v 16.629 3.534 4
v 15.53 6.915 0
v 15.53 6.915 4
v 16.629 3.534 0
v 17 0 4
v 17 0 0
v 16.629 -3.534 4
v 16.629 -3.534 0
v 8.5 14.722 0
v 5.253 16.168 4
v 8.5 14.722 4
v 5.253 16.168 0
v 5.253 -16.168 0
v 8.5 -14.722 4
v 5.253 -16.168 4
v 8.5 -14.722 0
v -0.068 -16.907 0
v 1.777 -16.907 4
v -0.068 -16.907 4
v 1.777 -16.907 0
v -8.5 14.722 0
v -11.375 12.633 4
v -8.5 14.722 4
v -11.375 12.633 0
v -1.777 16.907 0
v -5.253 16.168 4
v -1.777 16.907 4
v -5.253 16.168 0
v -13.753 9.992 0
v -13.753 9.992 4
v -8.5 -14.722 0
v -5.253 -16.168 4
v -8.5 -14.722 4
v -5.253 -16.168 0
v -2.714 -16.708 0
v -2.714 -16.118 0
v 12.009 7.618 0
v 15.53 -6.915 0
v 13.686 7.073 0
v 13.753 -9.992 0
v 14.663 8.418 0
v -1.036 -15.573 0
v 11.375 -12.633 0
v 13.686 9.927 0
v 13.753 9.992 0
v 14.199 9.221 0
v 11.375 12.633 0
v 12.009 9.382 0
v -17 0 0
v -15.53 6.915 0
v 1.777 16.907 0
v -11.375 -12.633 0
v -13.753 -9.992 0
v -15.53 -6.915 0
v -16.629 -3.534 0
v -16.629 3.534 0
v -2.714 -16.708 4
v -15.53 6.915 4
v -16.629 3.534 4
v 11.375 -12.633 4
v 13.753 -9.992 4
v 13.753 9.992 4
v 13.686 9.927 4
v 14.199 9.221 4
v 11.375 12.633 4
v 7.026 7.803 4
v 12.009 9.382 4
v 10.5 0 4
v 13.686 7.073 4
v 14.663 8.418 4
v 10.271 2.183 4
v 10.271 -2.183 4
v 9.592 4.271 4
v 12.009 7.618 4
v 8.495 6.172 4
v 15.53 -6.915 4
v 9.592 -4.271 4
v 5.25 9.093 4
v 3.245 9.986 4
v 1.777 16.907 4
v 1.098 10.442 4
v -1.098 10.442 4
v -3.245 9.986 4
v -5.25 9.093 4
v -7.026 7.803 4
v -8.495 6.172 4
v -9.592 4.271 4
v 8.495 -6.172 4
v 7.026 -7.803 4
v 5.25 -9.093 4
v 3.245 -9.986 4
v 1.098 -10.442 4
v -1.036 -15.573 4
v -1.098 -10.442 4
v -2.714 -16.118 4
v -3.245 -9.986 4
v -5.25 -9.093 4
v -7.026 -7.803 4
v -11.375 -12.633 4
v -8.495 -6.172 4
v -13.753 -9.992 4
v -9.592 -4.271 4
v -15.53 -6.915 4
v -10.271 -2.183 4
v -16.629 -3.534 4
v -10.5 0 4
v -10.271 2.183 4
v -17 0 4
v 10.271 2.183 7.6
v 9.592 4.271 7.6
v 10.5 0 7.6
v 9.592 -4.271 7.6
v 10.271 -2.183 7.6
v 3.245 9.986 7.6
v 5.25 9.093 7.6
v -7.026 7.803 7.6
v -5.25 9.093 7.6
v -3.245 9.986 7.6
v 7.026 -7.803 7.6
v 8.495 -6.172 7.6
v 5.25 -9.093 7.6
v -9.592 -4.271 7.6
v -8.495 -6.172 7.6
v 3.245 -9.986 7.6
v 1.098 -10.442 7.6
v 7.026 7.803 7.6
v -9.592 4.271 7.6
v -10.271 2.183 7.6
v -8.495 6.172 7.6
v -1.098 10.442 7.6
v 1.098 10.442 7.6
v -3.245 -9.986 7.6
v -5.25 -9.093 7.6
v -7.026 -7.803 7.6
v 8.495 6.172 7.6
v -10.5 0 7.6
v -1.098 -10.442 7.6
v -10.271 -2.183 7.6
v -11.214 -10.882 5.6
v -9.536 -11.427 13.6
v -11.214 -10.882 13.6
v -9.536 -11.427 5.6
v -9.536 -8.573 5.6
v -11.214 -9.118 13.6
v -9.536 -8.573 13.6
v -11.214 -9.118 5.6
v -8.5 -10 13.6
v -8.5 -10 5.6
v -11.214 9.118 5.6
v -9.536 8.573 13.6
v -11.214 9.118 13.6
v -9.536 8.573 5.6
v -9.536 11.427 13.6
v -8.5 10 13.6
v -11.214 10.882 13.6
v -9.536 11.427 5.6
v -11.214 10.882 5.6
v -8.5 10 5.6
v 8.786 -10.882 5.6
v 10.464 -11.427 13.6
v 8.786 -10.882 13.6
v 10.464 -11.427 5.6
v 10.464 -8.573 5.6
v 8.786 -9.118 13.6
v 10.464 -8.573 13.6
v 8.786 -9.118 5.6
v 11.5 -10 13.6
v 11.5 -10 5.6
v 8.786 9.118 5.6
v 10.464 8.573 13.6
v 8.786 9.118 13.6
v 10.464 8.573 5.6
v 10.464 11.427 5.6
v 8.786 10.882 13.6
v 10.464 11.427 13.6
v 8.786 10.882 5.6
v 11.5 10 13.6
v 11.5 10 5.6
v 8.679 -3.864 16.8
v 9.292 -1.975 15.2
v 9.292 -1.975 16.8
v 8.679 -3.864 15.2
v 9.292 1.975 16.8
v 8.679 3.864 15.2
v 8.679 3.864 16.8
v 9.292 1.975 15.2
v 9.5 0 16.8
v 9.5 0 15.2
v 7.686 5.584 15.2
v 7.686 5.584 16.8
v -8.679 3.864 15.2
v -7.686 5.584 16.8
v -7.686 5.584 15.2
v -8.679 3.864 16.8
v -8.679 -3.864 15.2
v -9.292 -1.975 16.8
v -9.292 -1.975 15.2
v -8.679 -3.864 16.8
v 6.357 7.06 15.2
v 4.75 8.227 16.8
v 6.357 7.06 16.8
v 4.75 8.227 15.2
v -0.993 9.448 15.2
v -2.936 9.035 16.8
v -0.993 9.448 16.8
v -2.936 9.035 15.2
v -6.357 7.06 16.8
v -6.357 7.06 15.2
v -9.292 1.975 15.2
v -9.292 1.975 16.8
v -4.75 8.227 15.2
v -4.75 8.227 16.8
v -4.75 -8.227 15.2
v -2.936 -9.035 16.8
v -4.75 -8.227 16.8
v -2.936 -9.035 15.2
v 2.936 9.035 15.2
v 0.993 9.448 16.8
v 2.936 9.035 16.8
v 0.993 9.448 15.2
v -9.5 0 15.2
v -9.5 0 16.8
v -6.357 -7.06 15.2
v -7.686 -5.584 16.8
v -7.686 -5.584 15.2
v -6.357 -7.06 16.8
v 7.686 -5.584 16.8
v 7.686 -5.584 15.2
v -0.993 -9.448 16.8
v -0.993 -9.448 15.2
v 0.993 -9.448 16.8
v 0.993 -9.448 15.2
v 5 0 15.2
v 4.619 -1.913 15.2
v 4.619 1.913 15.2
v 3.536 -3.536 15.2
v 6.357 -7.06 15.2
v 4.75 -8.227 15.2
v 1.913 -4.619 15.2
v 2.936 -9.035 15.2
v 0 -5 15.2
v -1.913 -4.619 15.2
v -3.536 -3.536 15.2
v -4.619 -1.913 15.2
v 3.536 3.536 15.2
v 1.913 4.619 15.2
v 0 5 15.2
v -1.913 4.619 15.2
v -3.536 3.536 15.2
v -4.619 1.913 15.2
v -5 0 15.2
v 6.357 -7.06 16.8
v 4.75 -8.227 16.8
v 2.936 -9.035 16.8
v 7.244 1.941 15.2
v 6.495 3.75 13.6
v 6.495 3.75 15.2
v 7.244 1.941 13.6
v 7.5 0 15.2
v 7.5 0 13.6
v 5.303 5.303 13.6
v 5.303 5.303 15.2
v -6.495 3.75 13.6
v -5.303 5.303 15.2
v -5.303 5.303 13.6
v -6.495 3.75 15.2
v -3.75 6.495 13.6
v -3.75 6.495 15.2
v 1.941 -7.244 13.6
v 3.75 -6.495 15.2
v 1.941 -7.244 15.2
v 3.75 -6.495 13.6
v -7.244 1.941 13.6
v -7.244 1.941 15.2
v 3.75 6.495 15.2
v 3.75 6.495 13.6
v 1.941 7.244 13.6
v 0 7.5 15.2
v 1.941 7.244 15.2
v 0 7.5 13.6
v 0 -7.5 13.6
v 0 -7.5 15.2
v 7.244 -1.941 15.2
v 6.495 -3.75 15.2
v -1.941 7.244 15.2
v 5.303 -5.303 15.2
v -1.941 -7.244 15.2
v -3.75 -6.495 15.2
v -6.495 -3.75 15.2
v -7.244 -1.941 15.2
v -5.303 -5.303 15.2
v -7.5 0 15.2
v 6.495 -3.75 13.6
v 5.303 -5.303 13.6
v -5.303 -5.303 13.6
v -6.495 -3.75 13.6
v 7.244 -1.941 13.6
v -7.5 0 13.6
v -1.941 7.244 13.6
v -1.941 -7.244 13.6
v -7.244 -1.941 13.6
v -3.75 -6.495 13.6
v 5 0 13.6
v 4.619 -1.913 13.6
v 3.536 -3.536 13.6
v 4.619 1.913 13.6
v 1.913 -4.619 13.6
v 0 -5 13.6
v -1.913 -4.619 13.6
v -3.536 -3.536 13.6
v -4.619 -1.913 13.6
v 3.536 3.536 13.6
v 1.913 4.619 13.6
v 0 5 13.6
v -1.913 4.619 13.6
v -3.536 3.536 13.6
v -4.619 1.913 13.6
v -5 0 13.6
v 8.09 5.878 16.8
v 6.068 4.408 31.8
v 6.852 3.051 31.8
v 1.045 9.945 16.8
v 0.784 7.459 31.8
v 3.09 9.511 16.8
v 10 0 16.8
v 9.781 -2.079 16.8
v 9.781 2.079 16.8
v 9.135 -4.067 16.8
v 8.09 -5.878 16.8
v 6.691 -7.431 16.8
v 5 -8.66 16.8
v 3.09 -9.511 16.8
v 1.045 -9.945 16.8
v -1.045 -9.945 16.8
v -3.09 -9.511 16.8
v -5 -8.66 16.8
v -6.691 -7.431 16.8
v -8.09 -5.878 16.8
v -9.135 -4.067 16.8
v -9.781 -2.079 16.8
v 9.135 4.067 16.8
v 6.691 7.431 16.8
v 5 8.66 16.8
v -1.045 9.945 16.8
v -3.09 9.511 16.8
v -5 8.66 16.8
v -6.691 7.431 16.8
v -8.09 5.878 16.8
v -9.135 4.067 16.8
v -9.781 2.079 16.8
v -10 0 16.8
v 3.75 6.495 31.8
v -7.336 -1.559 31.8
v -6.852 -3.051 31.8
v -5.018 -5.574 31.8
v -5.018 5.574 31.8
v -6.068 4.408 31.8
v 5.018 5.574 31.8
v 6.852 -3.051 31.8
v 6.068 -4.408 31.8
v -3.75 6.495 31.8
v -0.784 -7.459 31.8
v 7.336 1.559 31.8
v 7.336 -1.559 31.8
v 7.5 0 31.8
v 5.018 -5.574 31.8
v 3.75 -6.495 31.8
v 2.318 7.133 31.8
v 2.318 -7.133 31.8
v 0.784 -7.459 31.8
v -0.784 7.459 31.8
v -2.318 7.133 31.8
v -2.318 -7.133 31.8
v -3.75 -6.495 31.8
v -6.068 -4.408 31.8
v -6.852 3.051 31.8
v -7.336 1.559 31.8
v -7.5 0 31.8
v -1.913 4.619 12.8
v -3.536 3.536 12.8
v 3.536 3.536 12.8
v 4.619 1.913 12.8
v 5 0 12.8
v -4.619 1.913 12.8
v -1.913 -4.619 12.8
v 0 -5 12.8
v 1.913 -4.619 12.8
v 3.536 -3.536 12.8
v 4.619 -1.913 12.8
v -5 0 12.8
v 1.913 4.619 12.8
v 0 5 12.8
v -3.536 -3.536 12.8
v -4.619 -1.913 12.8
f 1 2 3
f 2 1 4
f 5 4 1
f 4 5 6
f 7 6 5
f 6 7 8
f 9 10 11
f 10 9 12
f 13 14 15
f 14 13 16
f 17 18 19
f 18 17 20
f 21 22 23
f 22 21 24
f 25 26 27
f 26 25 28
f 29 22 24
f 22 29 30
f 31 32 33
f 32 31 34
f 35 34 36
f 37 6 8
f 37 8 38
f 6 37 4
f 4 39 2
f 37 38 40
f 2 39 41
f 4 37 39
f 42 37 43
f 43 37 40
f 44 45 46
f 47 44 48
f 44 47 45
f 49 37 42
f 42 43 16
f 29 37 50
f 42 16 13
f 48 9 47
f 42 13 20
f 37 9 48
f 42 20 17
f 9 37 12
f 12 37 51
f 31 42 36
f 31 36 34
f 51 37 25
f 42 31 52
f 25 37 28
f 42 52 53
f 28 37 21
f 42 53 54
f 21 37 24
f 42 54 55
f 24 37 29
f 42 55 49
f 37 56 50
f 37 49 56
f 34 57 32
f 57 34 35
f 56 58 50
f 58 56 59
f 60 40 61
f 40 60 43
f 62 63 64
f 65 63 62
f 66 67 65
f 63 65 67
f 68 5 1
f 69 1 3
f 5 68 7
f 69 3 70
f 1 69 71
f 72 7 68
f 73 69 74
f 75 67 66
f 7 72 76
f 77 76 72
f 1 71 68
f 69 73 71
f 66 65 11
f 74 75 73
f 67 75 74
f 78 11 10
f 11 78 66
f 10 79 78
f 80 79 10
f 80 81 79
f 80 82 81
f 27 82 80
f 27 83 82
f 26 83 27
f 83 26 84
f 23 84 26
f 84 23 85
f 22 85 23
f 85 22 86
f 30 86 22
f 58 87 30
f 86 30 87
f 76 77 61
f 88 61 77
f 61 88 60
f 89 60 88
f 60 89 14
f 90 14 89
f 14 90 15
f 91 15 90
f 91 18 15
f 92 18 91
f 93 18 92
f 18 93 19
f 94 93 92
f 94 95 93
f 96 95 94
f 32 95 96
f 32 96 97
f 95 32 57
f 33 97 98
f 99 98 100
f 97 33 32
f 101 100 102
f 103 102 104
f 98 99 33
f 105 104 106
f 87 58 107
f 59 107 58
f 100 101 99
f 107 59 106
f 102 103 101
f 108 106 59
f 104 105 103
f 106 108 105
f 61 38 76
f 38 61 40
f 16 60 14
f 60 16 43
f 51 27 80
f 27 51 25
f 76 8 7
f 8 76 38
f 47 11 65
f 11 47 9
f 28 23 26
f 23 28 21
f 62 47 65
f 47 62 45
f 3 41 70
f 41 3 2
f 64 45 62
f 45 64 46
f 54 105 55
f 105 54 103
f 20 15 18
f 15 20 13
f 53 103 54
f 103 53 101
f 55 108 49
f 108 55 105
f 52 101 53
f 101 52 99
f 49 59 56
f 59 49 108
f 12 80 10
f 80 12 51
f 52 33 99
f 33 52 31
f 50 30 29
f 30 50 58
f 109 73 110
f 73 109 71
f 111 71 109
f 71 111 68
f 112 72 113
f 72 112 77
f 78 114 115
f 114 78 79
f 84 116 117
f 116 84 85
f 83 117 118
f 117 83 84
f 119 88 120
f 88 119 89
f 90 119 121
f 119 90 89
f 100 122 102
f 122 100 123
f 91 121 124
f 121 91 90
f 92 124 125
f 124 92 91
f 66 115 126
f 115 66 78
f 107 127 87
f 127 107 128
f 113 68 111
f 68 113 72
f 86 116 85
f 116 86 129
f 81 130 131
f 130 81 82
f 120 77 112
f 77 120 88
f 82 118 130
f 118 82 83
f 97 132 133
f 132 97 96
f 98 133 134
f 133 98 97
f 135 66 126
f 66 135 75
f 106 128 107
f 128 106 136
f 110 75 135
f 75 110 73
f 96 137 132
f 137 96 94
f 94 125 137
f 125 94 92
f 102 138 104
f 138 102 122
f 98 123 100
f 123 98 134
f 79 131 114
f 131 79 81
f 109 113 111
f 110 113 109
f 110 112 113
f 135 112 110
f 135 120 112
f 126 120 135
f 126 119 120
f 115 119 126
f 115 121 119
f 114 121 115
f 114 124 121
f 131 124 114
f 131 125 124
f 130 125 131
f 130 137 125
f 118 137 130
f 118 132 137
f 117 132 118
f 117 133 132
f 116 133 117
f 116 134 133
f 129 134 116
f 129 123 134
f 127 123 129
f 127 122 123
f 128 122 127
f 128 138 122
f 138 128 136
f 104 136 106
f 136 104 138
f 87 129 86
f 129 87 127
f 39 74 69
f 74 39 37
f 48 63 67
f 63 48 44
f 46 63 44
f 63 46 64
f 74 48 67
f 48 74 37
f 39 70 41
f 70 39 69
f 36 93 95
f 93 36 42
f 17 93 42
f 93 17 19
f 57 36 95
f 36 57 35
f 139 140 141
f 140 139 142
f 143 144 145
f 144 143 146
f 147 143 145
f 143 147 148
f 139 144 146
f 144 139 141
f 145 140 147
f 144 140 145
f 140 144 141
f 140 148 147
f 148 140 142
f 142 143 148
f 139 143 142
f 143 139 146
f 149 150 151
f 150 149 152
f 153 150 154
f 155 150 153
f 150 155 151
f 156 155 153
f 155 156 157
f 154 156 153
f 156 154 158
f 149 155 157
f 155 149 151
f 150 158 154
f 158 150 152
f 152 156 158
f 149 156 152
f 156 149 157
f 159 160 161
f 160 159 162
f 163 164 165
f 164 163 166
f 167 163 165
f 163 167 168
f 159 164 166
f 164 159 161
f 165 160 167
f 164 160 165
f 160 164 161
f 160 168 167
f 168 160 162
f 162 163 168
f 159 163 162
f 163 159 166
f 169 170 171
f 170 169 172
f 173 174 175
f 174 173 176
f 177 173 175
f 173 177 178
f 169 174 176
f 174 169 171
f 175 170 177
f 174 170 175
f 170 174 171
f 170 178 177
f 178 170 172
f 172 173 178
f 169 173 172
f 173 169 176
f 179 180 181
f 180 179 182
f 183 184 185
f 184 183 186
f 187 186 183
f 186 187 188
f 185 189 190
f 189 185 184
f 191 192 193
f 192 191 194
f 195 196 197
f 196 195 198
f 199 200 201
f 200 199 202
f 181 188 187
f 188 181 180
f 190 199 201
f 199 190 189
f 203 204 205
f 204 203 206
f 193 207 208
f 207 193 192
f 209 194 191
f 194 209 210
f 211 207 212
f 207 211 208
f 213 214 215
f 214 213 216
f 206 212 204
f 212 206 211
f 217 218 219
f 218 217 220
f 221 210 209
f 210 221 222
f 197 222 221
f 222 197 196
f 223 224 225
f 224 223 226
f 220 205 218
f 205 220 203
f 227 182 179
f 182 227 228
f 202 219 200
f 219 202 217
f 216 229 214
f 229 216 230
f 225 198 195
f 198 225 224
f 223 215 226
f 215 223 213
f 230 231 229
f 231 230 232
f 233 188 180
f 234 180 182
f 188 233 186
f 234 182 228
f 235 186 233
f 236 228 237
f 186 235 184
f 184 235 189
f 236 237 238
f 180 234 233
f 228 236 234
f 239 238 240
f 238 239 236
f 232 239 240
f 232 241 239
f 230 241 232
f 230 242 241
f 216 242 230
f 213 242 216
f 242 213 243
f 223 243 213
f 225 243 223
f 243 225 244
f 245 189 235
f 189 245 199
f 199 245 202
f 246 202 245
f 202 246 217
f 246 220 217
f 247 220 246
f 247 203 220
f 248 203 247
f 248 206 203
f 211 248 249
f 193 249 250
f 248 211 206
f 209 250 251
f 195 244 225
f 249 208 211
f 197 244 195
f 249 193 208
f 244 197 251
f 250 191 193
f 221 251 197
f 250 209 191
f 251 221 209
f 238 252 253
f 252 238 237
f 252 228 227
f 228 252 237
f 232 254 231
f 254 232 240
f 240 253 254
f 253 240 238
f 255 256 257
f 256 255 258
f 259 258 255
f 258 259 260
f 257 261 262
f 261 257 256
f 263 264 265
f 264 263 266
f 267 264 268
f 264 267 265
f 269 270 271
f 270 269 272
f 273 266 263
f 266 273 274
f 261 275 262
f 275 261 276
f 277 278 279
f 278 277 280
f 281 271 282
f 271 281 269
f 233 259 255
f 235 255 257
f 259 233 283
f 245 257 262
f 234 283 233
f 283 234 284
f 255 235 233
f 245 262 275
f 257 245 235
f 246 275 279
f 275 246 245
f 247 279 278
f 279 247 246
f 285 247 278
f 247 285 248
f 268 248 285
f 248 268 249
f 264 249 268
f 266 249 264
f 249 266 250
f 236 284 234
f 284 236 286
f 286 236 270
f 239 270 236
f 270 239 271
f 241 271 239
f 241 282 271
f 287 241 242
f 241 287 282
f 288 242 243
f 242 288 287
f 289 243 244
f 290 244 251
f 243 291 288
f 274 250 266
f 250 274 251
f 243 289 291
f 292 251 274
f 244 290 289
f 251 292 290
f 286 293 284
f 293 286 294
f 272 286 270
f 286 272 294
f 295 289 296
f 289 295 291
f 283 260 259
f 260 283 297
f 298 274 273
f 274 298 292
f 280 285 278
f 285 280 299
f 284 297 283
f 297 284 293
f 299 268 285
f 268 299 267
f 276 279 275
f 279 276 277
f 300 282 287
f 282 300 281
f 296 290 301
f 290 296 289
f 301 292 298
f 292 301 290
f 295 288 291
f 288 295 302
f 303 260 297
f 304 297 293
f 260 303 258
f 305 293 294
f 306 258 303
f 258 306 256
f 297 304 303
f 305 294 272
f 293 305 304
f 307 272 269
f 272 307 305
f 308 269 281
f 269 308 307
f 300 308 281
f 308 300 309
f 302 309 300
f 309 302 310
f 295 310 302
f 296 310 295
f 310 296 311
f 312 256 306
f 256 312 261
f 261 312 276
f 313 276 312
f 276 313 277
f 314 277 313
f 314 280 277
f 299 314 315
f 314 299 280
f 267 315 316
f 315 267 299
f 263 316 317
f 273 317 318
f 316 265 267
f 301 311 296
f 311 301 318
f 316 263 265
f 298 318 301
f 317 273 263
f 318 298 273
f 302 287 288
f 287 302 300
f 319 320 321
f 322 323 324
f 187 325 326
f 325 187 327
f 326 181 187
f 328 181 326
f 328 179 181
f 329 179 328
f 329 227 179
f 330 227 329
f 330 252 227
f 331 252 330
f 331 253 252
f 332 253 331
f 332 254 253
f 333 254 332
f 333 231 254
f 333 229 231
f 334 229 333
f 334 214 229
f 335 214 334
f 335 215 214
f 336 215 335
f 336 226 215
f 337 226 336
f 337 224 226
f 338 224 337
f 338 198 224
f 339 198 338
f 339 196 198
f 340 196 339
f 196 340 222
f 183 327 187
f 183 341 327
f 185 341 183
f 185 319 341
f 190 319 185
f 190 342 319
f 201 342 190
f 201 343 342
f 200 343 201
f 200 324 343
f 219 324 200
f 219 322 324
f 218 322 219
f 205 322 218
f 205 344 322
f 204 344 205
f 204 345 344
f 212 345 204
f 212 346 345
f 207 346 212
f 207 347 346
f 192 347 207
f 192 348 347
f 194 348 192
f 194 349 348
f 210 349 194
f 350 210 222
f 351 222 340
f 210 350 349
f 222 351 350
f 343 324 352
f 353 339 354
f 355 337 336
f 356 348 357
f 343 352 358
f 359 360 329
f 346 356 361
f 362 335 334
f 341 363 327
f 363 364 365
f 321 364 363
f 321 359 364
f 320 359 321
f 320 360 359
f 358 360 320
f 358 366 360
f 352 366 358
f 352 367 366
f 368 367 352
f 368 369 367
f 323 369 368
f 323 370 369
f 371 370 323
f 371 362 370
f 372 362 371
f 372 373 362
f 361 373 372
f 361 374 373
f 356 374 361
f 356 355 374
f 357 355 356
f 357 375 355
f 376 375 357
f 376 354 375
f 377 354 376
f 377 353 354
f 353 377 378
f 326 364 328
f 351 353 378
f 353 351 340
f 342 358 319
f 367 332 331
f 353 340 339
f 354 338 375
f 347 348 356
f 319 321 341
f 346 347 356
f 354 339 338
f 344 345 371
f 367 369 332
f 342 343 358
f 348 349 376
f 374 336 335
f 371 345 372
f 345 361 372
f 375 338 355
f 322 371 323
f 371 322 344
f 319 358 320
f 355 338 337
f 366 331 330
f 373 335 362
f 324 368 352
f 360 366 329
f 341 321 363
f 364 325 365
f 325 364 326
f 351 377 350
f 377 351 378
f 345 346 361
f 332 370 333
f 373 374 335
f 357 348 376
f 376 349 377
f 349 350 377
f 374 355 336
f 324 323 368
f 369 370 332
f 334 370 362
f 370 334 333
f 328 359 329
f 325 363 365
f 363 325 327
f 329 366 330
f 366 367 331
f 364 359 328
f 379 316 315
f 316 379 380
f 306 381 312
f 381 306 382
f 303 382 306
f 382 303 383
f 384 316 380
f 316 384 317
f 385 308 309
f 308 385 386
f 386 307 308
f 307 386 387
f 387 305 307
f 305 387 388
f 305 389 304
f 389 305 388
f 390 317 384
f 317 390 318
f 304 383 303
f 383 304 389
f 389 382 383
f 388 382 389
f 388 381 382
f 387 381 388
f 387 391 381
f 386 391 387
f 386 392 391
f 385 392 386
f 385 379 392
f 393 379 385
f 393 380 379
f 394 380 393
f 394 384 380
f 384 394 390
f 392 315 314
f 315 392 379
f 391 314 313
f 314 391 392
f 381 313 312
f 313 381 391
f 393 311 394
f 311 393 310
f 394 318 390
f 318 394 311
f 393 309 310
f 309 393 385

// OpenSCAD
// moisture_probe.scad — 电容式含水率探头 3D 设计
// ================================================
// Topic 5 Day 3 | Author: Little Husky 🐕 | Date: 2026-04-25
//
// v2 2026-05-17: Critical fixes:
//  - Funnel bottom now directly contacts upper press plate (was 7.2mm gap)
//  - Funnel bottom dia = plate_size (15mm) matching electrode (was 17mm)
//  - Funnel taller (15mm vs 7.2mm) for better bean guidance
//  - Guide channel extends from press top into electrode gap
//  - Cable exit moved from flange edge to funnel sidewall (fracture risk)
//  - Upper press central hole enlarged from φ2 to φ4 (bean passage)

// ═══════════════════════════════════════════════════════════
// 参数配置
// ═══════════════════════════════════════════════════════════

// 电极参数
plate_size = 15;      // mm — 电极边长（正方形）
plate_thick = 1.6;   // mm — PCB板厚度（FR4）

// 间隙参数
gap = 8.0;            // mm — 两极板间距离（含豆空间）
post_dia = 3.0;      // mm — 隔离柱直径

// 法兰参数
flange_dia = 34;     // mm — 安装法兰直径
flange_thick = 4;   // mm — 法兰厚度
bolt_hole_dia = 3.0; // mm — M3螺栓孔径
bolt_count = 3;      // M3螺栓数量

// 漏斗参数
funnel_top_dia = 20;        // mm — 入口直径
funnel_bot_dia = plate_size; // mm — 出口直径 = 电极尺寸，精准对接
funnel_height_mm = 15;      // mm — 漏斗高度（v2: 从7.2mm增至15mm）
guide_channel_dia = 10;     // mm — 导豆通道直径（v2新增）
guide_channel_depth = 4;    // mm — 导豆通道延伸深度（伸入电极间隙上半部）

// 电缆出口
cable_hole_dia = 6;  // mm — M6电缆密封头

// ═══════════════════════════════════════════════════════════
// Z坐标计算（关键：确保漏斗与压板零间隙对接）
// ═══════════════════════════════════════════════════════════
// z=0~4:           法兰底座 (flange_thick=4)
// z=4~5.6:         下极板托架 (plate_thick=1.6)
// z=5.6~6.6:       下极板PCB (计入托架余量)
// z=6.6~14.6:      电极间隙 (gap=8)
// z=14.6~16.2:     上极板PCB (plate_thick=1.6)
// z=16.2~17.8:     上极板压板 (plate_thick=1.6)
// z=17.8~32.8:     漏斗 (funnel_height=15)
// press_top_z = 17.8mm ← 漏斗底口直接落在此面上

press_top_z = flange_thick + plate_thick + gap + plate_thick + plate_thick;
// = 4 + 1.6 + 8 + 1.6 + 1.6 = 16.8mm

// ═══════════════════════════════════════════════════════════
// 模块定义
// ═══════════════════════════════════════════════════════════

// 底座法兰（集成下极板托架）
module flange_base_with_holder() {
    difference() {
        union() {
            // 法兰底座
            cylinder(d=flange_dia, h=flange_thick, center=false);
            // 下极板托架圆柱
            translate([0, 0, flange_thick])
                cylinder(d=plate_size + 6, h=plate_thick + 2, center=false);
        }
        // 法兰安装孔（3×M3，120°分布）
        for (i=[0:bolt_count-1]) {
            angle = i * 120 + 30;
            x = flange_dia/2 * cos(angle) - bolt_hole_dia/2;
            y = flange_dia/2 * sin(angle);
            translate([x, y, -1])
                cylinder(d=bolt_hole_dia, h=flange_thick+2, center=false);
        }
        // v2: 电缆出口孔改到漏斗侧壁（原在法兰边缘，有断裂风险）
        // 孔位于漏斗上部侧壁，距顶面3mm处
        translate([0, funnel_bot_dia/2 + funnel_height_mm * (funnel_top_dia - funnel_bot_dia) / (2 * funnel_height_mm), press_top_z + funnel_height_mm - 3])
            rotate([90, 0, 0])
                cylinder(d=cable_hole_dia, h=12, center=false);
    }
}

// 隔离柱（保证极板间隙）
module isolation_post() {
    cylinder(d=post_dia, h=gap, center=false);
}

// 四角隔离柱阵列
module post_array() {
    offset = plate_size/2 + post_dia/2 + 1;
    for (i=[-1, 1], j=[-1, 1]) {
        translate([i * offset, j * offset, flange_thick + plate_thick])
            isolation_post();
    }
}

// 上极板
module upper_electrode() {
    translate([0, 0, flange_thick + plate_thick + gap])
        cylinder(d=plate_size, h=plate_thick, center=false);
}

// 上极板压板
// v2: 中央通孔从φ2扩大到φ4（豆子需要通过）
module upper_press() {
    translate([0, 0, flange_thick + plate_thick + gap + plate_thick])
    difference() {
        cylinder(d=plate_size + 4, h=plate_thick, center=false);
        // v2: 中央通孔φ4（原φ2，豆子无法通过2mm孔）
        cylinder(d=4, h=plate_thick + 2, center=true);
    }
}

// 入口漏斗
// v2: 漏斗底口直接对接上压板顶面(z=press_top_z)，消除悬空间隙
// funnel_bot_dia = plate_size = 15mm，精准对接电极区域
module funnel() {
    // 漏斗底口直接落在上压板顶面 (z=press_top_z)
    translate([0, 0, press_top_z])
        cylinder(d1=funnel_top_dia, d2=funnel_bot_dia, h=funnel_height_mm, center=false);
}

// 导豆通道（v2新增）
// 从上压板中央φ4孔向下延伸，引导豆子进入8mm电极间隙
// 通道底部距下极板约4mm，确保豆子落入测量区而不卡住
module bean_guide_channel() {
    translate([0, 0, press_top_z - guide_channel_depth])
        cylinder(d=guide_channel_dia, h=guide_channel_depth + plate_thick + 0.5, center=false);
}

// ═══════════════════════════════════════════════════════════
// 完整装配
// ═══════════════════════════════════════════════════════════

module moisture_probe_assembly() {
    // 底座+下极板托架
    color("#90a4ae") flange_base_with_holder();
    // 隔离柱×4
    color("#78909c") post_array();
    // 上极板
    color("#cfd8dc") upper_electrode();
    // 上压板
    color("#b0bec5") upper_press();
    // 漏斗（直接对接压板，无间隙）
    color("#b0bec5") funnel();
    // 导豆通道（v2新增）
    color("#a0b0c0") bean_guide_channel();
}

moisture_probe_assembly();

// ═══════════════════════════════════════════════════════════
// 打印说明
// ═══════════════════════════════════════════════════════════
// 推荐打印参数:
//   材料: PETG（食品级，耐温）或SLA光敏树脂（更高精度）
//   层高: 0.2mm（PETG）或 0.1mm（SLA）
//   填充: 40%+（功能件需足够强度）
//   打印方向: 底面朝下（法兰水平），最优
//   支撑: 漏斗需要支撑
//
// 装配顺序:
//   1. 法兰+下极板 一体打印
//   2. 隔离柱×4 单独打印（需精确直径±0.05mm）
//   3. 上极板+压板 打印
//   4. 漏斗+导豆通道 打印（需支撑）
//
// v2 变更:
//   - 漏斗底口从 z=24mm(悬空7.2mm) 改为 z=16.8mm(直接对接压板)
//   - 漏斗底径从 17mm 改为 15mm (=plate_size)
//   - 漏斗高度从 7.2mm 增至 15mm
//   - 新增导豆通道φ10×4mm，引导豆子进入电极间隙
//   - 上压板中央孔从φ2扩大到φ4
//   - 电缆出口从法兰边缘改到漏斗侧壁
//
// AD7746模块安装:
//   ⚠️ AD7746必须紧贴探头(<5cm引线)，通过I2C缓冲器(PCA9600)延长到Pi
//   电缆使用屏蔽线，避免寄生电容超出±4pF量程
